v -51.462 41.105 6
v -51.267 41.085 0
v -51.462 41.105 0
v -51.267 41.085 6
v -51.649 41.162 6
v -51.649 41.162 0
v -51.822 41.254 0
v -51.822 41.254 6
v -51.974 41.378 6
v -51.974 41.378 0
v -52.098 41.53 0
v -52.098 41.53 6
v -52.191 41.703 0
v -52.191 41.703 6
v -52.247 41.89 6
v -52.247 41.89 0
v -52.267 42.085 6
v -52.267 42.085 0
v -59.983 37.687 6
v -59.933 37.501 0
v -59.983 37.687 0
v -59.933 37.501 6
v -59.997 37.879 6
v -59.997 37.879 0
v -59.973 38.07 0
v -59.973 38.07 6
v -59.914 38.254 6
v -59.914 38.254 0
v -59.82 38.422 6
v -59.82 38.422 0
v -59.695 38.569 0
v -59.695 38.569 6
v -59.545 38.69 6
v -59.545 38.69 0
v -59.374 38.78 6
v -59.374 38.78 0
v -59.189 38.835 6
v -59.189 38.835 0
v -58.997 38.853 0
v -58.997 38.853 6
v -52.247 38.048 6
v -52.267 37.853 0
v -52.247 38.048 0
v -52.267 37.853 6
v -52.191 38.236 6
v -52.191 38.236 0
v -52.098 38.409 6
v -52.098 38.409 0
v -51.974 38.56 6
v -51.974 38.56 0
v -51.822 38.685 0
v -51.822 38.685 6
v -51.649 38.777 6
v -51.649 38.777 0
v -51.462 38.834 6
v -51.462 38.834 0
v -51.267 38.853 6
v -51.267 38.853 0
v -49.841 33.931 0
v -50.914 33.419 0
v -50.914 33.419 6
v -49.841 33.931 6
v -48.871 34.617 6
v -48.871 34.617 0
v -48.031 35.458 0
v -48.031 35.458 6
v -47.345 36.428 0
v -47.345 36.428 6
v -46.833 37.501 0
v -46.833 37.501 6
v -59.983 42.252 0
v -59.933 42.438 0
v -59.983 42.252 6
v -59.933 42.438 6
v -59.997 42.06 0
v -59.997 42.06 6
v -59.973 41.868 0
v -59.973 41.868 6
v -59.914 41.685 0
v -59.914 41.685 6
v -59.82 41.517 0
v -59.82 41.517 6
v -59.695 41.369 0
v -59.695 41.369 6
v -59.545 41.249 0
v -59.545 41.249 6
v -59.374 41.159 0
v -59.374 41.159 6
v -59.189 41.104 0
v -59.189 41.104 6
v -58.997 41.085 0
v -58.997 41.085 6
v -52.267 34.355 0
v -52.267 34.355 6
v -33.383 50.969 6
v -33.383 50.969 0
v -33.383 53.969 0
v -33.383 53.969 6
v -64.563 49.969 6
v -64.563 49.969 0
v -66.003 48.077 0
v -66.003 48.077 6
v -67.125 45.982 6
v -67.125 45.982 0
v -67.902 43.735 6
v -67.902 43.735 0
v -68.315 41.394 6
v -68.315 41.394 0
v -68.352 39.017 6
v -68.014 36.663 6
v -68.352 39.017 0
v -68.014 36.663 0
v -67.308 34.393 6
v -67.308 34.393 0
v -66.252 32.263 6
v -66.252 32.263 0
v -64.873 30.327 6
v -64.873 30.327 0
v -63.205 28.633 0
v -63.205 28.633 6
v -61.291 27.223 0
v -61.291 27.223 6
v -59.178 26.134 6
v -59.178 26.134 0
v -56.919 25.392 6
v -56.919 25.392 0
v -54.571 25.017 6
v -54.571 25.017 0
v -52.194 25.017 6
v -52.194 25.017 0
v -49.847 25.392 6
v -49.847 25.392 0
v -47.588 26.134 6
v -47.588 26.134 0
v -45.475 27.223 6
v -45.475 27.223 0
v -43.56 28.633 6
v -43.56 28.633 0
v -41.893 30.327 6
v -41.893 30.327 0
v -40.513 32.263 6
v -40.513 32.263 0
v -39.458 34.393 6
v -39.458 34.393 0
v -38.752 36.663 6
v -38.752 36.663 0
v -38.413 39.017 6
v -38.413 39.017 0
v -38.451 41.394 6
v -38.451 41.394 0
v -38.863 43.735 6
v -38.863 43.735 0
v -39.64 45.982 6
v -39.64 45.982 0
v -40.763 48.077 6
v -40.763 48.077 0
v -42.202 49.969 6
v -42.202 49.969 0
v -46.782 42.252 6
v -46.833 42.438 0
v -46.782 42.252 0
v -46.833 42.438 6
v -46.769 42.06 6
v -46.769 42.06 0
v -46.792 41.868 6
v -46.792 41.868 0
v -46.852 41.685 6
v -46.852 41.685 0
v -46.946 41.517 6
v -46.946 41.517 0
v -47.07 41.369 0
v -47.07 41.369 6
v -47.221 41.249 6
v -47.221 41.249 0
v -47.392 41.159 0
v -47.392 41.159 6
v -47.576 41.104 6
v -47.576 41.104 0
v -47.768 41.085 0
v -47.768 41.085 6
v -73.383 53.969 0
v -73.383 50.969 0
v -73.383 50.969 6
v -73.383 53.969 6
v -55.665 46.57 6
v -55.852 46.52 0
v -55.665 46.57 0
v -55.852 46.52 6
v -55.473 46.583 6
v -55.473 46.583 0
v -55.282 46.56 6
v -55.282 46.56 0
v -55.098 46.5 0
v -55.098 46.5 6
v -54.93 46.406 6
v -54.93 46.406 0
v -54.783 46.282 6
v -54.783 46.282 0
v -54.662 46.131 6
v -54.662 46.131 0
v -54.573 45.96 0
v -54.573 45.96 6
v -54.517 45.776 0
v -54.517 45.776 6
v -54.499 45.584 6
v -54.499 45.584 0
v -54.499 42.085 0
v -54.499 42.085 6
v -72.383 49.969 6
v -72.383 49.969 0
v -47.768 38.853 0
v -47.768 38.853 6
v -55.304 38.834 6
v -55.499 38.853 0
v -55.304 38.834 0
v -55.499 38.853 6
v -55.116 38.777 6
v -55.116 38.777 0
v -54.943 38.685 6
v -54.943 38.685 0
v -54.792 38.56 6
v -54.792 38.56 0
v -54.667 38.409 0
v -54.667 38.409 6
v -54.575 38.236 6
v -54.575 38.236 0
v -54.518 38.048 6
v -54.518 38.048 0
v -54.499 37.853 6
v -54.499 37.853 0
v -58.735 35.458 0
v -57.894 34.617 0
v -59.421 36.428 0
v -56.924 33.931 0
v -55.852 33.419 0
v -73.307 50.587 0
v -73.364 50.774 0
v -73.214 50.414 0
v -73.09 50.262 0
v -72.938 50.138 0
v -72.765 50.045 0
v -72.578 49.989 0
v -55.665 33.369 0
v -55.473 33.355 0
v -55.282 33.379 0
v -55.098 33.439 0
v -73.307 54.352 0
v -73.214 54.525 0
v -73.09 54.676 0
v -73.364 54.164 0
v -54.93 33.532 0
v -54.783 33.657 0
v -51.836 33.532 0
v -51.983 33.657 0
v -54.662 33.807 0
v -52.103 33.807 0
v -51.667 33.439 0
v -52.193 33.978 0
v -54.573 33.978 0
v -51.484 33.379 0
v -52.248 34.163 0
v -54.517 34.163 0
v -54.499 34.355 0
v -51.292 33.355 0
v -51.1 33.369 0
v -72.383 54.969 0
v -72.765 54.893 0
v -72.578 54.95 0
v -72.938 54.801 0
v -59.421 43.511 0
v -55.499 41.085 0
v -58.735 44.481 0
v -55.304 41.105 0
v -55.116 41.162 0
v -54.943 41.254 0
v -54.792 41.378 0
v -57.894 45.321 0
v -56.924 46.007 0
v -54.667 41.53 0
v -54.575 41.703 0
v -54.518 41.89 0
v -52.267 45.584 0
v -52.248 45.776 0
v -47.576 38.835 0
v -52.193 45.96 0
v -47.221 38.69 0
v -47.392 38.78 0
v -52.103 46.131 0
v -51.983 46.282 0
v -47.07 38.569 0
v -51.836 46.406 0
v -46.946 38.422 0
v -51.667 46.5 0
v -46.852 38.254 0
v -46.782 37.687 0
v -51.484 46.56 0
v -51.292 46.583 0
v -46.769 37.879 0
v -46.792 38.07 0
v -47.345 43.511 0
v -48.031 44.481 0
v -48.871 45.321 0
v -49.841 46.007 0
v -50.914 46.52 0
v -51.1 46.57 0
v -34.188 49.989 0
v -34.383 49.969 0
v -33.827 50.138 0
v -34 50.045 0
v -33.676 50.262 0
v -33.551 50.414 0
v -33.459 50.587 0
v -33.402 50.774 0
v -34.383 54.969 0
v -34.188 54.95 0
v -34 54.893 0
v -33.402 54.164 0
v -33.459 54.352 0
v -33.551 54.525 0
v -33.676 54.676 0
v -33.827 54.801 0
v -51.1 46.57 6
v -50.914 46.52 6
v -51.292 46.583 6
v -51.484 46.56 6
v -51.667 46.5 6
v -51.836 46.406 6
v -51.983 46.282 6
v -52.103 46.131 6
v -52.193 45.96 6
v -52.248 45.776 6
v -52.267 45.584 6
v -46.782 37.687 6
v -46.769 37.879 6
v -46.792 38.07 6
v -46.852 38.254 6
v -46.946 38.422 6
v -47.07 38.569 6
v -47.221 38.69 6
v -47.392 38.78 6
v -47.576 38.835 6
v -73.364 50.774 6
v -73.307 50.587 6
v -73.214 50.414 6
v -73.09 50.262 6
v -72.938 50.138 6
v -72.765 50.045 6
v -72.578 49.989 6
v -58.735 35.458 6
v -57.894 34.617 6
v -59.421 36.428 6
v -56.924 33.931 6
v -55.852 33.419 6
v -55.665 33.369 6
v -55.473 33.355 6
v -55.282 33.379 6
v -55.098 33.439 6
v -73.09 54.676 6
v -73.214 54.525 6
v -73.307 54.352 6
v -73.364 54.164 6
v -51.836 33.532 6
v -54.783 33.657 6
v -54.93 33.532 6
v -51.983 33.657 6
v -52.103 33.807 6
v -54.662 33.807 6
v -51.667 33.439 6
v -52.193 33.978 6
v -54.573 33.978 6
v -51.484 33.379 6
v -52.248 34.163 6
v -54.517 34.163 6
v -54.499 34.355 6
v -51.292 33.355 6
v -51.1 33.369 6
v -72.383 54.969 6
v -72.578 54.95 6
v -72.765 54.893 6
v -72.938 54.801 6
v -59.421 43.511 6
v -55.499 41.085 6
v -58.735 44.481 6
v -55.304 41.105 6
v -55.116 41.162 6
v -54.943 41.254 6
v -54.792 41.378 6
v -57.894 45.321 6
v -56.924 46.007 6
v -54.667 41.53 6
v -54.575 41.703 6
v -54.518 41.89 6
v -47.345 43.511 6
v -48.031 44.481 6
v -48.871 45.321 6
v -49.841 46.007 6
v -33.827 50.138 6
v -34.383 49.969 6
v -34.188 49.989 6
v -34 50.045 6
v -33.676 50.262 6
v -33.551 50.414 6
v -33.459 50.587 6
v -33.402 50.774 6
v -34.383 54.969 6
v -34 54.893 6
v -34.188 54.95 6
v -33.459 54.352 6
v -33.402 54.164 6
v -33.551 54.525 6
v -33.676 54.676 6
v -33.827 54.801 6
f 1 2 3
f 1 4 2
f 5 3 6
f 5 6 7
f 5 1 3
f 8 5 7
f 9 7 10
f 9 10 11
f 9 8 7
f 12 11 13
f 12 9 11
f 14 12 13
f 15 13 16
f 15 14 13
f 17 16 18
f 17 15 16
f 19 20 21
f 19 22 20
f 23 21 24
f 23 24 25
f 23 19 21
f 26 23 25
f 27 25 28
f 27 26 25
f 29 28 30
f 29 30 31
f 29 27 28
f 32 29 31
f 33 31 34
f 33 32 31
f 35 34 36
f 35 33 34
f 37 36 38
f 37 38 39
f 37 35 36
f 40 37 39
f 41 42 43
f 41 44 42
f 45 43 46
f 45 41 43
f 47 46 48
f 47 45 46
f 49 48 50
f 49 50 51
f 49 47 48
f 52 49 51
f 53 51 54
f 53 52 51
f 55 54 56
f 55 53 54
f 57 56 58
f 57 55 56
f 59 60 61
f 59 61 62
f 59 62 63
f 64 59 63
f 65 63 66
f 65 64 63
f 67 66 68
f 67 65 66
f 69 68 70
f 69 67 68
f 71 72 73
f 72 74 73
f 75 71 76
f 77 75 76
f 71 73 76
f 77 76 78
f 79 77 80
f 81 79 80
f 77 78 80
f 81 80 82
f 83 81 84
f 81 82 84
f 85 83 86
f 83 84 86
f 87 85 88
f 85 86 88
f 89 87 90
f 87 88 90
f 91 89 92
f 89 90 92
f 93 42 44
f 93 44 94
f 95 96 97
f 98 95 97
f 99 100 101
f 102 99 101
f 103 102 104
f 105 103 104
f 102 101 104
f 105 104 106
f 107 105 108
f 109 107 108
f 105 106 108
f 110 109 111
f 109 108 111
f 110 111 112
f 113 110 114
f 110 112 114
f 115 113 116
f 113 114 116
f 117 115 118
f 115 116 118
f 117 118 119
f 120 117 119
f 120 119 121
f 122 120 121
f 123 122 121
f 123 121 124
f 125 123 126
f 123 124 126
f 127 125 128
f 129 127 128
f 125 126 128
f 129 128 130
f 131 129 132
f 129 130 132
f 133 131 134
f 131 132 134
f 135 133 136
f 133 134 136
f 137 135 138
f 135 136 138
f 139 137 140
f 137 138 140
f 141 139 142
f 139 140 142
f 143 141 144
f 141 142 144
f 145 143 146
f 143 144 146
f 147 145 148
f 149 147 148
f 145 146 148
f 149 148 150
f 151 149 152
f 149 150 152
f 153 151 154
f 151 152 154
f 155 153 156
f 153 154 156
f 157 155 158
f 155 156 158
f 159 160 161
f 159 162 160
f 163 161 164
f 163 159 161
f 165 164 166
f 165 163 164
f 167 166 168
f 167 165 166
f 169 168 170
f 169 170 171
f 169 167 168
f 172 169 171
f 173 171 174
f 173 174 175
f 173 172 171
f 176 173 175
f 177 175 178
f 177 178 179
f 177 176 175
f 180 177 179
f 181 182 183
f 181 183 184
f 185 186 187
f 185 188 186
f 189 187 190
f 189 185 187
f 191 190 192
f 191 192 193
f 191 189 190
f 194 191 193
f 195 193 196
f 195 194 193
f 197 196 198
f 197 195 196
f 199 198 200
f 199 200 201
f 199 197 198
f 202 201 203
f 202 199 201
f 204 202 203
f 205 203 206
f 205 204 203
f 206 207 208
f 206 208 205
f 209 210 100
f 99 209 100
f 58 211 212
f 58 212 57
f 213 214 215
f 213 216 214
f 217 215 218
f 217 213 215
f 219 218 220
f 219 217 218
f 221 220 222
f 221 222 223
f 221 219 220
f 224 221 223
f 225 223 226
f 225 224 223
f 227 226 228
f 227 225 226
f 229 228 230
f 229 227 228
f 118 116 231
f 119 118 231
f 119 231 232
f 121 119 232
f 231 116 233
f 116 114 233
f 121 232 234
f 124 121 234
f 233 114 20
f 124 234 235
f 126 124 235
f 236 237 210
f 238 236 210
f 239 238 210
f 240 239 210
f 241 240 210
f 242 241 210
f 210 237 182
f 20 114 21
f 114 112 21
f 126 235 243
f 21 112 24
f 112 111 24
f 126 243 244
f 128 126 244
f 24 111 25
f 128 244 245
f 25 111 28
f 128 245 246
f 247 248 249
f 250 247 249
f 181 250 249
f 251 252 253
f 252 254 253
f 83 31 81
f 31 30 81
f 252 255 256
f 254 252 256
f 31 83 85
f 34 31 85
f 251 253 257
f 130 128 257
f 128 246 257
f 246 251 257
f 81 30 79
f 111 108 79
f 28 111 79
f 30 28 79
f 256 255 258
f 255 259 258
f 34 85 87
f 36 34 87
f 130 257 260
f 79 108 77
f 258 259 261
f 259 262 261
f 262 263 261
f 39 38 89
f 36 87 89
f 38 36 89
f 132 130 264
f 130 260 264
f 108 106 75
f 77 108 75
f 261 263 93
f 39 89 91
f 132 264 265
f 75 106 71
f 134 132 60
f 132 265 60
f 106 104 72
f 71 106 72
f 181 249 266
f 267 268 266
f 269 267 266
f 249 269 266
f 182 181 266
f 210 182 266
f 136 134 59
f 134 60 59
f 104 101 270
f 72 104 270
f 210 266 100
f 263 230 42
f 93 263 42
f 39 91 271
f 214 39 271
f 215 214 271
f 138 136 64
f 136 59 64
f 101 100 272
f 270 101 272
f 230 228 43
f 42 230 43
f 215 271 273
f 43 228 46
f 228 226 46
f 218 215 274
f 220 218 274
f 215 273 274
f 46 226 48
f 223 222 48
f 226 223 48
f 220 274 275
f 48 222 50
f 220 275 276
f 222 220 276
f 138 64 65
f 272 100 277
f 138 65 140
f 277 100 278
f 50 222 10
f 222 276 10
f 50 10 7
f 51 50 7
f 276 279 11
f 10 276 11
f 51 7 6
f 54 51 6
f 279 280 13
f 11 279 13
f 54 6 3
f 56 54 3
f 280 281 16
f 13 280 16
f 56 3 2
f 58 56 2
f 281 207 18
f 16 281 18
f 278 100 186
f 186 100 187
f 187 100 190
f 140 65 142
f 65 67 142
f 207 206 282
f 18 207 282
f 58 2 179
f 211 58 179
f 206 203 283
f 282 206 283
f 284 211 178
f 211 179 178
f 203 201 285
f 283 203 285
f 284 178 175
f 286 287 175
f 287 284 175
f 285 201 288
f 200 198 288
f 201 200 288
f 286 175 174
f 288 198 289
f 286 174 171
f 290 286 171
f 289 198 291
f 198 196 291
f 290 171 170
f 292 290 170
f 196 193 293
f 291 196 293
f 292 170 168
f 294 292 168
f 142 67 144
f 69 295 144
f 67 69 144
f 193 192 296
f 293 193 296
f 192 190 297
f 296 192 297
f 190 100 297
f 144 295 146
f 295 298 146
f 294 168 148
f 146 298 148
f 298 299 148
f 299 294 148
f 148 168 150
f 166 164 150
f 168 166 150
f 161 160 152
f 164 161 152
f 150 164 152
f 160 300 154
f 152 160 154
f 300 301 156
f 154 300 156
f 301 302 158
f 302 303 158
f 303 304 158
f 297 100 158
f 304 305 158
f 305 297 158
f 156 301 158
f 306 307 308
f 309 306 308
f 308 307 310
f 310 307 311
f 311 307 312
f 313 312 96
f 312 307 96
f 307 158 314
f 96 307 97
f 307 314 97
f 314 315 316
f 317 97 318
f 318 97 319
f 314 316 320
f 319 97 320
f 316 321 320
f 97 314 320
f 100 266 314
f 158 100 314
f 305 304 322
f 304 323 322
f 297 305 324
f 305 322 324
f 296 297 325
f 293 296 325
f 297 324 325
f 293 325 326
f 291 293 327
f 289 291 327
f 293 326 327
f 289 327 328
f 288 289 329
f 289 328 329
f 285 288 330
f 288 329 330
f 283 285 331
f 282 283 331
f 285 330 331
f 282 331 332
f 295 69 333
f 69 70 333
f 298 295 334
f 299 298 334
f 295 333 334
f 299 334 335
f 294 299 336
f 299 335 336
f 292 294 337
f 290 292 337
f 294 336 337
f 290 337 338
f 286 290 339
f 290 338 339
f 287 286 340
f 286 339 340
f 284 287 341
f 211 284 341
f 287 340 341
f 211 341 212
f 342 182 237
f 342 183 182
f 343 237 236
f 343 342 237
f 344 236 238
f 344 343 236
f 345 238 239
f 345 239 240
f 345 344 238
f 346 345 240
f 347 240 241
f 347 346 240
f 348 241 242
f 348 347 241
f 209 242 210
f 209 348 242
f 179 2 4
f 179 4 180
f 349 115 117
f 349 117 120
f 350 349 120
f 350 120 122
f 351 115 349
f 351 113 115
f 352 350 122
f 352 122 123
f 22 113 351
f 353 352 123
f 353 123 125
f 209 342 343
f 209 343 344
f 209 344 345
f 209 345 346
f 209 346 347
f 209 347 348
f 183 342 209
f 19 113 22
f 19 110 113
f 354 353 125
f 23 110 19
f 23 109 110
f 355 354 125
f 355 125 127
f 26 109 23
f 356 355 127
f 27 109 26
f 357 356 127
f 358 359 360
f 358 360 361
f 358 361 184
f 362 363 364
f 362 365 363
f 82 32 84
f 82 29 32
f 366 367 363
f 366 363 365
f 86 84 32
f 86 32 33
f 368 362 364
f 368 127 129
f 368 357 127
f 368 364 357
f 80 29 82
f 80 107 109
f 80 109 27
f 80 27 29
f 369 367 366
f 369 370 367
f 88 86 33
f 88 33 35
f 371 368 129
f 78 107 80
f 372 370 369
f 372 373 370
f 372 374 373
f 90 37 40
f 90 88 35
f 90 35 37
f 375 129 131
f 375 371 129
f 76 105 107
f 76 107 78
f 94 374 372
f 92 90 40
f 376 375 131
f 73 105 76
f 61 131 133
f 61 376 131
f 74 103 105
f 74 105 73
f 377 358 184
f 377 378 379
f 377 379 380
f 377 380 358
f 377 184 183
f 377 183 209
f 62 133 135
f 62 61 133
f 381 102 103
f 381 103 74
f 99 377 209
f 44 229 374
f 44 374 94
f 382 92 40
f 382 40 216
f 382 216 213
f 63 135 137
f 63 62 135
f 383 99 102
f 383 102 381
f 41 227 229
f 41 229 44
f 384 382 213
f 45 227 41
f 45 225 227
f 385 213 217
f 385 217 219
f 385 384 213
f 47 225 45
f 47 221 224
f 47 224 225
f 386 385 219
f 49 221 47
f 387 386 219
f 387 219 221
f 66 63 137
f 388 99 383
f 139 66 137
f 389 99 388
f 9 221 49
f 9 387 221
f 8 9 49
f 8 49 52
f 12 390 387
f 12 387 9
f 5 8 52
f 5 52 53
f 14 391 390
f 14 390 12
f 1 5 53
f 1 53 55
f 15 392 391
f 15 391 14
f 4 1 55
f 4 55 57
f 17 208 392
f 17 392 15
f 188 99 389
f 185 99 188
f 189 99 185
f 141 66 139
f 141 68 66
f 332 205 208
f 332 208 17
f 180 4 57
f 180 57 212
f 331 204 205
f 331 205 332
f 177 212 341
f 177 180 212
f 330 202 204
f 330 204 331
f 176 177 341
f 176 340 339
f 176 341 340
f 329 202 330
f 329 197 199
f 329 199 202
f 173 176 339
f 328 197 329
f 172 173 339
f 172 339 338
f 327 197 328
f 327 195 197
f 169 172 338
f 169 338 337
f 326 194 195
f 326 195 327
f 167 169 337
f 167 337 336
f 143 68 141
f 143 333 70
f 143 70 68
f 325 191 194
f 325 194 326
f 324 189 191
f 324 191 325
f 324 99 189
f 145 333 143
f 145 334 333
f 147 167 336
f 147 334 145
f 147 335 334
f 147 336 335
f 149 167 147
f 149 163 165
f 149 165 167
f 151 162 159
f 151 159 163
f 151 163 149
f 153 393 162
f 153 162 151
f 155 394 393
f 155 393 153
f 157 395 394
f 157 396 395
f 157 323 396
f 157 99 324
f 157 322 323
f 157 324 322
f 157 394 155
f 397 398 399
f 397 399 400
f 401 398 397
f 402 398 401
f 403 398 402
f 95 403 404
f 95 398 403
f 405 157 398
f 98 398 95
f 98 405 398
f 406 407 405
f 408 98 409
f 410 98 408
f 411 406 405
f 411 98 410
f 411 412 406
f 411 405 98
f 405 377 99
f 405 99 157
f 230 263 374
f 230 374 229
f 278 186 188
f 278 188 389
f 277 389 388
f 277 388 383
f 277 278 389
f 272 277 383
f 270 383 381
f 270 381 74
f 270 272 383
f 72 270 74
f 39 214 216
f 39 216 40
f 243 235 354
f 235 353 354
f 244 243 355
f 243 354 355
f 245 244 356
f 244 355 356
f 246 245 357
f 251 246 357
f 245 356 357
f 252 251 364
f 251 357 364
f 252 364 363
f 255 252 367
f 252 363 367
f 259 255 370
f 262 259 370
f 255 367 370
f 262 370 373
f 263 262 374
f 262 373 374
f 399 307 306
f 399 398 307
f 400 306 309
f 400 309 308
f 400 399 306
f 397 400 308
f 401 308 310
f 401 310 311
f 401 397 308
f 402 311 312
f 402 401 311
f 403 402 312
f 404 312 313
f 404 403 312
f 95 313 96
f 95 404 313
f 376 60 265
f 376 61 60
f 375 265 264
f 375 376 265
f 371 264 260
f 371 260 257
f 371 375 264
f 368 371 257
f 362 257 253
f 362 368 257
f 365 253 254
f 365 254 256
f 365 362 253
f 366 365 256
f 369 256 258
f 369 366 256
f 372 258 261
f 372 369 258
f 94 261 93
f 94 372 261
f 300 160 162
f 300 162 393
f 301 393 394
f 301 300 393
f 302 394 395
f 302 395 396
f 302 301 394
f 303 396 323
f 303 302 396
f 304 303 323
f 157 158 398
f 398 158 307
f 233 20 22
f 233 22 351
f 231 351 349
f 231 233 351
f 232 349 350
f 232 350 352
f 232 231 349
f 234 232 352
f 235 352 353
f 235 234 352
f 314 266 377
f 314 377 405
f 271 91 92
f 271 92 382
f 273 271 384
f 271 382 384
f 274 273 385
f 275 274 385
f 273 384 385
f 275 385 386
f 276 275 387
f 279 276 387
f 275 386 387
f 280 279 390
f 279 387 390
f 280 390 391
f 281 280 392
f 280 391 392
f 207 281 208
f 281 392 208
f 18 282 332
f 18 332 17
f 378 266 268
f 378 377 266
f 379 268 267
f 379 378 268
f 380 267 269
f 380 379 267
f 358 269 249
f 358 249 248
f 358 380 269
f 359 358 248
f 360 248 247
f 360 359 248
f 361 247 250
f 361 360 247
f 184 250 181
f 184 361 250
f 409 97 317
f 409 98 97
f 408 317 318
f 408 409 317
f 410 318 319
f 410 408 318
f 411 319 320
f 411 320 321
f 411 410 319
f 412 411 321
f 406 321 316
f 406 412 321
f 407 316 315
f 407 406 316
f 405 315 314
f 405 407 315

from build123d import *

# Parameters (mm, degrees)
SKETCH2_W           = 40
SKETCH2_H           = 5
SKETCH2_R           = 10
BOSS_EXTRUDE2_DEPTH = 6
FILLET1_R           = 1
FILLET2_R           = 1
FILLET3_R           = 1


with BuildPart() as part:
    # Sketch2 → Boss-Extrude2 (new body)
    # profile 1 of 3: a face of its own
    with BuildSketch(Plane.XY):
        with BuildLine():
            ThreePointArc((-64.563103681, 49.969328221), (-53.382763794, 24.969328221), (-42.202423906, 49.969328221))
            Line((-42.202423906, 49.969328221), (-53.382763794, 49.969328221))
            Line((-53.382763794, 49.969328221), (-64.563103681, 49.969328221))
        make_face()
        with BuildLine():
            ThreePointArc((-43.382763794, 39.969328221), (-60.453831606, 32.89826041), (-53.382763794, 49.969328221))
            ThreePointArc((-53.382763794, 49.969328221), (-46.311695982, 47.040396033), (-43.382763794, 39.969328221))
        make_face(mode=Mode.SUBTRACT)
    # profile 2 of 3: a face of its own
    with BuildSketch(Plane.XY):
        with Locations((-53.382763794, 52.469328221)):
            Rectangle(SKETCH2_W, SKETCH2_H)
    # profile 3 of 3: a face of its own
    with BuildSketch(Plane.XY):
        with Locations((-53.382763794, 39.969328221)):
            Circle(SKETCH2_R)
        with BuildLine():
            ThreePointArc((-52.266628854, 33.05888375), (-48.433016326, 35.019580753), (-46.472319322, 38.853193281))
            Line((-46.472319322, 38.853193281), (-52.266628854, 38.853193281))
            Line((-52.266628854, 38.853193281), (-52.266628854, 33.05888375))
        make_face(mode=Mode.SUBTRACT)
        with BuildLine():
            ThreePointArc((-60.293208266, 38.853193281), (-58.332511262, 35.019580753), (-54.498898734, 33.05888375))
            Line((-54.498898734, 33.05888375), (-54.498898734, 38.853193281))
            Line((-54.498898734, 38.853193281), (-60.293208266, 38.853193281))
        make_face(mode=Mode.SUBTRACT)
        with BuildLine():
            ThreePointArc((-46.472319322, 41.085463162), (-48.433016326, 44.91907569), (-52.266628854, 46.879772693))
            Line((-52.266628854, 46.879772693), (-52.266628854, 41.085463162))
            Line((-52.266628854, 41.085463162), (-46.472319322, 41.085463162))
        make_face(mode=Mode.SUBTRACT)
        with BuildLine():
            ThreePointArc((-54.498898734, 46.879772693), (-58.332511262, 44.91907569), (-60.293208266, 41.085463162))
            Line((-60.293208266, 41.085463162), (-54.498898734, 41.085463162))
            Line((-54.498898734, 41.085463162), (-54.498898734, 46.879772693))
        make_face(mode=Mode.SUBTRACT)
    extrude(amount=BOSS_EXTRUDE2_DEPTH)

    # Fillet1
    fillet1_edges = [part.edges().sort_by_distance(p)[0] for p in [
        (-60.293208266, 41.085463162, 3),
        (-54.498898734, 41.085463162, 3),
        (-54.498898734, 46.879772693, 3),
        (-52.266628854, 46.879772693, 3),
        (-52.266628854, 41.085463162, 3),
        (-46.472319322, 41.085463162, 3),
        (-54.498898734, 33.05888375, 3),
        (-60.293208266, 38.853193281, 3),
        (-46.472319322, 38.853193281, 3),
        (-52.266628854, 33.05888375, 3),
    ]]
    fillet(fillet1_edges, radius=FILLET1_R)

    # Fillet2
    fillet2_edges = [part.edges().sort_by_distance(p)[0] for p in [
        (-54.498898734, 38.853193281, 3),
        (-52.266628854, 38.853193281, 3),
    ]]
    fillet(fillet2_edges, radius=FILLET2_R)

    # Fillet3
    fillet3_edges = [part.edges().sort_by_distance(p)[0] for p in [
        (-73.382763794, 49.969328221, 3),
        (-73.382763794, 54.969328221, 3),
        (-33.382763794, 54.969328221, 3),
        (-33.382763794, 49.969328221, 3),
    ]]
    fillet(fillet3_edges, radius=FILLET3_R)


solid = part.part
